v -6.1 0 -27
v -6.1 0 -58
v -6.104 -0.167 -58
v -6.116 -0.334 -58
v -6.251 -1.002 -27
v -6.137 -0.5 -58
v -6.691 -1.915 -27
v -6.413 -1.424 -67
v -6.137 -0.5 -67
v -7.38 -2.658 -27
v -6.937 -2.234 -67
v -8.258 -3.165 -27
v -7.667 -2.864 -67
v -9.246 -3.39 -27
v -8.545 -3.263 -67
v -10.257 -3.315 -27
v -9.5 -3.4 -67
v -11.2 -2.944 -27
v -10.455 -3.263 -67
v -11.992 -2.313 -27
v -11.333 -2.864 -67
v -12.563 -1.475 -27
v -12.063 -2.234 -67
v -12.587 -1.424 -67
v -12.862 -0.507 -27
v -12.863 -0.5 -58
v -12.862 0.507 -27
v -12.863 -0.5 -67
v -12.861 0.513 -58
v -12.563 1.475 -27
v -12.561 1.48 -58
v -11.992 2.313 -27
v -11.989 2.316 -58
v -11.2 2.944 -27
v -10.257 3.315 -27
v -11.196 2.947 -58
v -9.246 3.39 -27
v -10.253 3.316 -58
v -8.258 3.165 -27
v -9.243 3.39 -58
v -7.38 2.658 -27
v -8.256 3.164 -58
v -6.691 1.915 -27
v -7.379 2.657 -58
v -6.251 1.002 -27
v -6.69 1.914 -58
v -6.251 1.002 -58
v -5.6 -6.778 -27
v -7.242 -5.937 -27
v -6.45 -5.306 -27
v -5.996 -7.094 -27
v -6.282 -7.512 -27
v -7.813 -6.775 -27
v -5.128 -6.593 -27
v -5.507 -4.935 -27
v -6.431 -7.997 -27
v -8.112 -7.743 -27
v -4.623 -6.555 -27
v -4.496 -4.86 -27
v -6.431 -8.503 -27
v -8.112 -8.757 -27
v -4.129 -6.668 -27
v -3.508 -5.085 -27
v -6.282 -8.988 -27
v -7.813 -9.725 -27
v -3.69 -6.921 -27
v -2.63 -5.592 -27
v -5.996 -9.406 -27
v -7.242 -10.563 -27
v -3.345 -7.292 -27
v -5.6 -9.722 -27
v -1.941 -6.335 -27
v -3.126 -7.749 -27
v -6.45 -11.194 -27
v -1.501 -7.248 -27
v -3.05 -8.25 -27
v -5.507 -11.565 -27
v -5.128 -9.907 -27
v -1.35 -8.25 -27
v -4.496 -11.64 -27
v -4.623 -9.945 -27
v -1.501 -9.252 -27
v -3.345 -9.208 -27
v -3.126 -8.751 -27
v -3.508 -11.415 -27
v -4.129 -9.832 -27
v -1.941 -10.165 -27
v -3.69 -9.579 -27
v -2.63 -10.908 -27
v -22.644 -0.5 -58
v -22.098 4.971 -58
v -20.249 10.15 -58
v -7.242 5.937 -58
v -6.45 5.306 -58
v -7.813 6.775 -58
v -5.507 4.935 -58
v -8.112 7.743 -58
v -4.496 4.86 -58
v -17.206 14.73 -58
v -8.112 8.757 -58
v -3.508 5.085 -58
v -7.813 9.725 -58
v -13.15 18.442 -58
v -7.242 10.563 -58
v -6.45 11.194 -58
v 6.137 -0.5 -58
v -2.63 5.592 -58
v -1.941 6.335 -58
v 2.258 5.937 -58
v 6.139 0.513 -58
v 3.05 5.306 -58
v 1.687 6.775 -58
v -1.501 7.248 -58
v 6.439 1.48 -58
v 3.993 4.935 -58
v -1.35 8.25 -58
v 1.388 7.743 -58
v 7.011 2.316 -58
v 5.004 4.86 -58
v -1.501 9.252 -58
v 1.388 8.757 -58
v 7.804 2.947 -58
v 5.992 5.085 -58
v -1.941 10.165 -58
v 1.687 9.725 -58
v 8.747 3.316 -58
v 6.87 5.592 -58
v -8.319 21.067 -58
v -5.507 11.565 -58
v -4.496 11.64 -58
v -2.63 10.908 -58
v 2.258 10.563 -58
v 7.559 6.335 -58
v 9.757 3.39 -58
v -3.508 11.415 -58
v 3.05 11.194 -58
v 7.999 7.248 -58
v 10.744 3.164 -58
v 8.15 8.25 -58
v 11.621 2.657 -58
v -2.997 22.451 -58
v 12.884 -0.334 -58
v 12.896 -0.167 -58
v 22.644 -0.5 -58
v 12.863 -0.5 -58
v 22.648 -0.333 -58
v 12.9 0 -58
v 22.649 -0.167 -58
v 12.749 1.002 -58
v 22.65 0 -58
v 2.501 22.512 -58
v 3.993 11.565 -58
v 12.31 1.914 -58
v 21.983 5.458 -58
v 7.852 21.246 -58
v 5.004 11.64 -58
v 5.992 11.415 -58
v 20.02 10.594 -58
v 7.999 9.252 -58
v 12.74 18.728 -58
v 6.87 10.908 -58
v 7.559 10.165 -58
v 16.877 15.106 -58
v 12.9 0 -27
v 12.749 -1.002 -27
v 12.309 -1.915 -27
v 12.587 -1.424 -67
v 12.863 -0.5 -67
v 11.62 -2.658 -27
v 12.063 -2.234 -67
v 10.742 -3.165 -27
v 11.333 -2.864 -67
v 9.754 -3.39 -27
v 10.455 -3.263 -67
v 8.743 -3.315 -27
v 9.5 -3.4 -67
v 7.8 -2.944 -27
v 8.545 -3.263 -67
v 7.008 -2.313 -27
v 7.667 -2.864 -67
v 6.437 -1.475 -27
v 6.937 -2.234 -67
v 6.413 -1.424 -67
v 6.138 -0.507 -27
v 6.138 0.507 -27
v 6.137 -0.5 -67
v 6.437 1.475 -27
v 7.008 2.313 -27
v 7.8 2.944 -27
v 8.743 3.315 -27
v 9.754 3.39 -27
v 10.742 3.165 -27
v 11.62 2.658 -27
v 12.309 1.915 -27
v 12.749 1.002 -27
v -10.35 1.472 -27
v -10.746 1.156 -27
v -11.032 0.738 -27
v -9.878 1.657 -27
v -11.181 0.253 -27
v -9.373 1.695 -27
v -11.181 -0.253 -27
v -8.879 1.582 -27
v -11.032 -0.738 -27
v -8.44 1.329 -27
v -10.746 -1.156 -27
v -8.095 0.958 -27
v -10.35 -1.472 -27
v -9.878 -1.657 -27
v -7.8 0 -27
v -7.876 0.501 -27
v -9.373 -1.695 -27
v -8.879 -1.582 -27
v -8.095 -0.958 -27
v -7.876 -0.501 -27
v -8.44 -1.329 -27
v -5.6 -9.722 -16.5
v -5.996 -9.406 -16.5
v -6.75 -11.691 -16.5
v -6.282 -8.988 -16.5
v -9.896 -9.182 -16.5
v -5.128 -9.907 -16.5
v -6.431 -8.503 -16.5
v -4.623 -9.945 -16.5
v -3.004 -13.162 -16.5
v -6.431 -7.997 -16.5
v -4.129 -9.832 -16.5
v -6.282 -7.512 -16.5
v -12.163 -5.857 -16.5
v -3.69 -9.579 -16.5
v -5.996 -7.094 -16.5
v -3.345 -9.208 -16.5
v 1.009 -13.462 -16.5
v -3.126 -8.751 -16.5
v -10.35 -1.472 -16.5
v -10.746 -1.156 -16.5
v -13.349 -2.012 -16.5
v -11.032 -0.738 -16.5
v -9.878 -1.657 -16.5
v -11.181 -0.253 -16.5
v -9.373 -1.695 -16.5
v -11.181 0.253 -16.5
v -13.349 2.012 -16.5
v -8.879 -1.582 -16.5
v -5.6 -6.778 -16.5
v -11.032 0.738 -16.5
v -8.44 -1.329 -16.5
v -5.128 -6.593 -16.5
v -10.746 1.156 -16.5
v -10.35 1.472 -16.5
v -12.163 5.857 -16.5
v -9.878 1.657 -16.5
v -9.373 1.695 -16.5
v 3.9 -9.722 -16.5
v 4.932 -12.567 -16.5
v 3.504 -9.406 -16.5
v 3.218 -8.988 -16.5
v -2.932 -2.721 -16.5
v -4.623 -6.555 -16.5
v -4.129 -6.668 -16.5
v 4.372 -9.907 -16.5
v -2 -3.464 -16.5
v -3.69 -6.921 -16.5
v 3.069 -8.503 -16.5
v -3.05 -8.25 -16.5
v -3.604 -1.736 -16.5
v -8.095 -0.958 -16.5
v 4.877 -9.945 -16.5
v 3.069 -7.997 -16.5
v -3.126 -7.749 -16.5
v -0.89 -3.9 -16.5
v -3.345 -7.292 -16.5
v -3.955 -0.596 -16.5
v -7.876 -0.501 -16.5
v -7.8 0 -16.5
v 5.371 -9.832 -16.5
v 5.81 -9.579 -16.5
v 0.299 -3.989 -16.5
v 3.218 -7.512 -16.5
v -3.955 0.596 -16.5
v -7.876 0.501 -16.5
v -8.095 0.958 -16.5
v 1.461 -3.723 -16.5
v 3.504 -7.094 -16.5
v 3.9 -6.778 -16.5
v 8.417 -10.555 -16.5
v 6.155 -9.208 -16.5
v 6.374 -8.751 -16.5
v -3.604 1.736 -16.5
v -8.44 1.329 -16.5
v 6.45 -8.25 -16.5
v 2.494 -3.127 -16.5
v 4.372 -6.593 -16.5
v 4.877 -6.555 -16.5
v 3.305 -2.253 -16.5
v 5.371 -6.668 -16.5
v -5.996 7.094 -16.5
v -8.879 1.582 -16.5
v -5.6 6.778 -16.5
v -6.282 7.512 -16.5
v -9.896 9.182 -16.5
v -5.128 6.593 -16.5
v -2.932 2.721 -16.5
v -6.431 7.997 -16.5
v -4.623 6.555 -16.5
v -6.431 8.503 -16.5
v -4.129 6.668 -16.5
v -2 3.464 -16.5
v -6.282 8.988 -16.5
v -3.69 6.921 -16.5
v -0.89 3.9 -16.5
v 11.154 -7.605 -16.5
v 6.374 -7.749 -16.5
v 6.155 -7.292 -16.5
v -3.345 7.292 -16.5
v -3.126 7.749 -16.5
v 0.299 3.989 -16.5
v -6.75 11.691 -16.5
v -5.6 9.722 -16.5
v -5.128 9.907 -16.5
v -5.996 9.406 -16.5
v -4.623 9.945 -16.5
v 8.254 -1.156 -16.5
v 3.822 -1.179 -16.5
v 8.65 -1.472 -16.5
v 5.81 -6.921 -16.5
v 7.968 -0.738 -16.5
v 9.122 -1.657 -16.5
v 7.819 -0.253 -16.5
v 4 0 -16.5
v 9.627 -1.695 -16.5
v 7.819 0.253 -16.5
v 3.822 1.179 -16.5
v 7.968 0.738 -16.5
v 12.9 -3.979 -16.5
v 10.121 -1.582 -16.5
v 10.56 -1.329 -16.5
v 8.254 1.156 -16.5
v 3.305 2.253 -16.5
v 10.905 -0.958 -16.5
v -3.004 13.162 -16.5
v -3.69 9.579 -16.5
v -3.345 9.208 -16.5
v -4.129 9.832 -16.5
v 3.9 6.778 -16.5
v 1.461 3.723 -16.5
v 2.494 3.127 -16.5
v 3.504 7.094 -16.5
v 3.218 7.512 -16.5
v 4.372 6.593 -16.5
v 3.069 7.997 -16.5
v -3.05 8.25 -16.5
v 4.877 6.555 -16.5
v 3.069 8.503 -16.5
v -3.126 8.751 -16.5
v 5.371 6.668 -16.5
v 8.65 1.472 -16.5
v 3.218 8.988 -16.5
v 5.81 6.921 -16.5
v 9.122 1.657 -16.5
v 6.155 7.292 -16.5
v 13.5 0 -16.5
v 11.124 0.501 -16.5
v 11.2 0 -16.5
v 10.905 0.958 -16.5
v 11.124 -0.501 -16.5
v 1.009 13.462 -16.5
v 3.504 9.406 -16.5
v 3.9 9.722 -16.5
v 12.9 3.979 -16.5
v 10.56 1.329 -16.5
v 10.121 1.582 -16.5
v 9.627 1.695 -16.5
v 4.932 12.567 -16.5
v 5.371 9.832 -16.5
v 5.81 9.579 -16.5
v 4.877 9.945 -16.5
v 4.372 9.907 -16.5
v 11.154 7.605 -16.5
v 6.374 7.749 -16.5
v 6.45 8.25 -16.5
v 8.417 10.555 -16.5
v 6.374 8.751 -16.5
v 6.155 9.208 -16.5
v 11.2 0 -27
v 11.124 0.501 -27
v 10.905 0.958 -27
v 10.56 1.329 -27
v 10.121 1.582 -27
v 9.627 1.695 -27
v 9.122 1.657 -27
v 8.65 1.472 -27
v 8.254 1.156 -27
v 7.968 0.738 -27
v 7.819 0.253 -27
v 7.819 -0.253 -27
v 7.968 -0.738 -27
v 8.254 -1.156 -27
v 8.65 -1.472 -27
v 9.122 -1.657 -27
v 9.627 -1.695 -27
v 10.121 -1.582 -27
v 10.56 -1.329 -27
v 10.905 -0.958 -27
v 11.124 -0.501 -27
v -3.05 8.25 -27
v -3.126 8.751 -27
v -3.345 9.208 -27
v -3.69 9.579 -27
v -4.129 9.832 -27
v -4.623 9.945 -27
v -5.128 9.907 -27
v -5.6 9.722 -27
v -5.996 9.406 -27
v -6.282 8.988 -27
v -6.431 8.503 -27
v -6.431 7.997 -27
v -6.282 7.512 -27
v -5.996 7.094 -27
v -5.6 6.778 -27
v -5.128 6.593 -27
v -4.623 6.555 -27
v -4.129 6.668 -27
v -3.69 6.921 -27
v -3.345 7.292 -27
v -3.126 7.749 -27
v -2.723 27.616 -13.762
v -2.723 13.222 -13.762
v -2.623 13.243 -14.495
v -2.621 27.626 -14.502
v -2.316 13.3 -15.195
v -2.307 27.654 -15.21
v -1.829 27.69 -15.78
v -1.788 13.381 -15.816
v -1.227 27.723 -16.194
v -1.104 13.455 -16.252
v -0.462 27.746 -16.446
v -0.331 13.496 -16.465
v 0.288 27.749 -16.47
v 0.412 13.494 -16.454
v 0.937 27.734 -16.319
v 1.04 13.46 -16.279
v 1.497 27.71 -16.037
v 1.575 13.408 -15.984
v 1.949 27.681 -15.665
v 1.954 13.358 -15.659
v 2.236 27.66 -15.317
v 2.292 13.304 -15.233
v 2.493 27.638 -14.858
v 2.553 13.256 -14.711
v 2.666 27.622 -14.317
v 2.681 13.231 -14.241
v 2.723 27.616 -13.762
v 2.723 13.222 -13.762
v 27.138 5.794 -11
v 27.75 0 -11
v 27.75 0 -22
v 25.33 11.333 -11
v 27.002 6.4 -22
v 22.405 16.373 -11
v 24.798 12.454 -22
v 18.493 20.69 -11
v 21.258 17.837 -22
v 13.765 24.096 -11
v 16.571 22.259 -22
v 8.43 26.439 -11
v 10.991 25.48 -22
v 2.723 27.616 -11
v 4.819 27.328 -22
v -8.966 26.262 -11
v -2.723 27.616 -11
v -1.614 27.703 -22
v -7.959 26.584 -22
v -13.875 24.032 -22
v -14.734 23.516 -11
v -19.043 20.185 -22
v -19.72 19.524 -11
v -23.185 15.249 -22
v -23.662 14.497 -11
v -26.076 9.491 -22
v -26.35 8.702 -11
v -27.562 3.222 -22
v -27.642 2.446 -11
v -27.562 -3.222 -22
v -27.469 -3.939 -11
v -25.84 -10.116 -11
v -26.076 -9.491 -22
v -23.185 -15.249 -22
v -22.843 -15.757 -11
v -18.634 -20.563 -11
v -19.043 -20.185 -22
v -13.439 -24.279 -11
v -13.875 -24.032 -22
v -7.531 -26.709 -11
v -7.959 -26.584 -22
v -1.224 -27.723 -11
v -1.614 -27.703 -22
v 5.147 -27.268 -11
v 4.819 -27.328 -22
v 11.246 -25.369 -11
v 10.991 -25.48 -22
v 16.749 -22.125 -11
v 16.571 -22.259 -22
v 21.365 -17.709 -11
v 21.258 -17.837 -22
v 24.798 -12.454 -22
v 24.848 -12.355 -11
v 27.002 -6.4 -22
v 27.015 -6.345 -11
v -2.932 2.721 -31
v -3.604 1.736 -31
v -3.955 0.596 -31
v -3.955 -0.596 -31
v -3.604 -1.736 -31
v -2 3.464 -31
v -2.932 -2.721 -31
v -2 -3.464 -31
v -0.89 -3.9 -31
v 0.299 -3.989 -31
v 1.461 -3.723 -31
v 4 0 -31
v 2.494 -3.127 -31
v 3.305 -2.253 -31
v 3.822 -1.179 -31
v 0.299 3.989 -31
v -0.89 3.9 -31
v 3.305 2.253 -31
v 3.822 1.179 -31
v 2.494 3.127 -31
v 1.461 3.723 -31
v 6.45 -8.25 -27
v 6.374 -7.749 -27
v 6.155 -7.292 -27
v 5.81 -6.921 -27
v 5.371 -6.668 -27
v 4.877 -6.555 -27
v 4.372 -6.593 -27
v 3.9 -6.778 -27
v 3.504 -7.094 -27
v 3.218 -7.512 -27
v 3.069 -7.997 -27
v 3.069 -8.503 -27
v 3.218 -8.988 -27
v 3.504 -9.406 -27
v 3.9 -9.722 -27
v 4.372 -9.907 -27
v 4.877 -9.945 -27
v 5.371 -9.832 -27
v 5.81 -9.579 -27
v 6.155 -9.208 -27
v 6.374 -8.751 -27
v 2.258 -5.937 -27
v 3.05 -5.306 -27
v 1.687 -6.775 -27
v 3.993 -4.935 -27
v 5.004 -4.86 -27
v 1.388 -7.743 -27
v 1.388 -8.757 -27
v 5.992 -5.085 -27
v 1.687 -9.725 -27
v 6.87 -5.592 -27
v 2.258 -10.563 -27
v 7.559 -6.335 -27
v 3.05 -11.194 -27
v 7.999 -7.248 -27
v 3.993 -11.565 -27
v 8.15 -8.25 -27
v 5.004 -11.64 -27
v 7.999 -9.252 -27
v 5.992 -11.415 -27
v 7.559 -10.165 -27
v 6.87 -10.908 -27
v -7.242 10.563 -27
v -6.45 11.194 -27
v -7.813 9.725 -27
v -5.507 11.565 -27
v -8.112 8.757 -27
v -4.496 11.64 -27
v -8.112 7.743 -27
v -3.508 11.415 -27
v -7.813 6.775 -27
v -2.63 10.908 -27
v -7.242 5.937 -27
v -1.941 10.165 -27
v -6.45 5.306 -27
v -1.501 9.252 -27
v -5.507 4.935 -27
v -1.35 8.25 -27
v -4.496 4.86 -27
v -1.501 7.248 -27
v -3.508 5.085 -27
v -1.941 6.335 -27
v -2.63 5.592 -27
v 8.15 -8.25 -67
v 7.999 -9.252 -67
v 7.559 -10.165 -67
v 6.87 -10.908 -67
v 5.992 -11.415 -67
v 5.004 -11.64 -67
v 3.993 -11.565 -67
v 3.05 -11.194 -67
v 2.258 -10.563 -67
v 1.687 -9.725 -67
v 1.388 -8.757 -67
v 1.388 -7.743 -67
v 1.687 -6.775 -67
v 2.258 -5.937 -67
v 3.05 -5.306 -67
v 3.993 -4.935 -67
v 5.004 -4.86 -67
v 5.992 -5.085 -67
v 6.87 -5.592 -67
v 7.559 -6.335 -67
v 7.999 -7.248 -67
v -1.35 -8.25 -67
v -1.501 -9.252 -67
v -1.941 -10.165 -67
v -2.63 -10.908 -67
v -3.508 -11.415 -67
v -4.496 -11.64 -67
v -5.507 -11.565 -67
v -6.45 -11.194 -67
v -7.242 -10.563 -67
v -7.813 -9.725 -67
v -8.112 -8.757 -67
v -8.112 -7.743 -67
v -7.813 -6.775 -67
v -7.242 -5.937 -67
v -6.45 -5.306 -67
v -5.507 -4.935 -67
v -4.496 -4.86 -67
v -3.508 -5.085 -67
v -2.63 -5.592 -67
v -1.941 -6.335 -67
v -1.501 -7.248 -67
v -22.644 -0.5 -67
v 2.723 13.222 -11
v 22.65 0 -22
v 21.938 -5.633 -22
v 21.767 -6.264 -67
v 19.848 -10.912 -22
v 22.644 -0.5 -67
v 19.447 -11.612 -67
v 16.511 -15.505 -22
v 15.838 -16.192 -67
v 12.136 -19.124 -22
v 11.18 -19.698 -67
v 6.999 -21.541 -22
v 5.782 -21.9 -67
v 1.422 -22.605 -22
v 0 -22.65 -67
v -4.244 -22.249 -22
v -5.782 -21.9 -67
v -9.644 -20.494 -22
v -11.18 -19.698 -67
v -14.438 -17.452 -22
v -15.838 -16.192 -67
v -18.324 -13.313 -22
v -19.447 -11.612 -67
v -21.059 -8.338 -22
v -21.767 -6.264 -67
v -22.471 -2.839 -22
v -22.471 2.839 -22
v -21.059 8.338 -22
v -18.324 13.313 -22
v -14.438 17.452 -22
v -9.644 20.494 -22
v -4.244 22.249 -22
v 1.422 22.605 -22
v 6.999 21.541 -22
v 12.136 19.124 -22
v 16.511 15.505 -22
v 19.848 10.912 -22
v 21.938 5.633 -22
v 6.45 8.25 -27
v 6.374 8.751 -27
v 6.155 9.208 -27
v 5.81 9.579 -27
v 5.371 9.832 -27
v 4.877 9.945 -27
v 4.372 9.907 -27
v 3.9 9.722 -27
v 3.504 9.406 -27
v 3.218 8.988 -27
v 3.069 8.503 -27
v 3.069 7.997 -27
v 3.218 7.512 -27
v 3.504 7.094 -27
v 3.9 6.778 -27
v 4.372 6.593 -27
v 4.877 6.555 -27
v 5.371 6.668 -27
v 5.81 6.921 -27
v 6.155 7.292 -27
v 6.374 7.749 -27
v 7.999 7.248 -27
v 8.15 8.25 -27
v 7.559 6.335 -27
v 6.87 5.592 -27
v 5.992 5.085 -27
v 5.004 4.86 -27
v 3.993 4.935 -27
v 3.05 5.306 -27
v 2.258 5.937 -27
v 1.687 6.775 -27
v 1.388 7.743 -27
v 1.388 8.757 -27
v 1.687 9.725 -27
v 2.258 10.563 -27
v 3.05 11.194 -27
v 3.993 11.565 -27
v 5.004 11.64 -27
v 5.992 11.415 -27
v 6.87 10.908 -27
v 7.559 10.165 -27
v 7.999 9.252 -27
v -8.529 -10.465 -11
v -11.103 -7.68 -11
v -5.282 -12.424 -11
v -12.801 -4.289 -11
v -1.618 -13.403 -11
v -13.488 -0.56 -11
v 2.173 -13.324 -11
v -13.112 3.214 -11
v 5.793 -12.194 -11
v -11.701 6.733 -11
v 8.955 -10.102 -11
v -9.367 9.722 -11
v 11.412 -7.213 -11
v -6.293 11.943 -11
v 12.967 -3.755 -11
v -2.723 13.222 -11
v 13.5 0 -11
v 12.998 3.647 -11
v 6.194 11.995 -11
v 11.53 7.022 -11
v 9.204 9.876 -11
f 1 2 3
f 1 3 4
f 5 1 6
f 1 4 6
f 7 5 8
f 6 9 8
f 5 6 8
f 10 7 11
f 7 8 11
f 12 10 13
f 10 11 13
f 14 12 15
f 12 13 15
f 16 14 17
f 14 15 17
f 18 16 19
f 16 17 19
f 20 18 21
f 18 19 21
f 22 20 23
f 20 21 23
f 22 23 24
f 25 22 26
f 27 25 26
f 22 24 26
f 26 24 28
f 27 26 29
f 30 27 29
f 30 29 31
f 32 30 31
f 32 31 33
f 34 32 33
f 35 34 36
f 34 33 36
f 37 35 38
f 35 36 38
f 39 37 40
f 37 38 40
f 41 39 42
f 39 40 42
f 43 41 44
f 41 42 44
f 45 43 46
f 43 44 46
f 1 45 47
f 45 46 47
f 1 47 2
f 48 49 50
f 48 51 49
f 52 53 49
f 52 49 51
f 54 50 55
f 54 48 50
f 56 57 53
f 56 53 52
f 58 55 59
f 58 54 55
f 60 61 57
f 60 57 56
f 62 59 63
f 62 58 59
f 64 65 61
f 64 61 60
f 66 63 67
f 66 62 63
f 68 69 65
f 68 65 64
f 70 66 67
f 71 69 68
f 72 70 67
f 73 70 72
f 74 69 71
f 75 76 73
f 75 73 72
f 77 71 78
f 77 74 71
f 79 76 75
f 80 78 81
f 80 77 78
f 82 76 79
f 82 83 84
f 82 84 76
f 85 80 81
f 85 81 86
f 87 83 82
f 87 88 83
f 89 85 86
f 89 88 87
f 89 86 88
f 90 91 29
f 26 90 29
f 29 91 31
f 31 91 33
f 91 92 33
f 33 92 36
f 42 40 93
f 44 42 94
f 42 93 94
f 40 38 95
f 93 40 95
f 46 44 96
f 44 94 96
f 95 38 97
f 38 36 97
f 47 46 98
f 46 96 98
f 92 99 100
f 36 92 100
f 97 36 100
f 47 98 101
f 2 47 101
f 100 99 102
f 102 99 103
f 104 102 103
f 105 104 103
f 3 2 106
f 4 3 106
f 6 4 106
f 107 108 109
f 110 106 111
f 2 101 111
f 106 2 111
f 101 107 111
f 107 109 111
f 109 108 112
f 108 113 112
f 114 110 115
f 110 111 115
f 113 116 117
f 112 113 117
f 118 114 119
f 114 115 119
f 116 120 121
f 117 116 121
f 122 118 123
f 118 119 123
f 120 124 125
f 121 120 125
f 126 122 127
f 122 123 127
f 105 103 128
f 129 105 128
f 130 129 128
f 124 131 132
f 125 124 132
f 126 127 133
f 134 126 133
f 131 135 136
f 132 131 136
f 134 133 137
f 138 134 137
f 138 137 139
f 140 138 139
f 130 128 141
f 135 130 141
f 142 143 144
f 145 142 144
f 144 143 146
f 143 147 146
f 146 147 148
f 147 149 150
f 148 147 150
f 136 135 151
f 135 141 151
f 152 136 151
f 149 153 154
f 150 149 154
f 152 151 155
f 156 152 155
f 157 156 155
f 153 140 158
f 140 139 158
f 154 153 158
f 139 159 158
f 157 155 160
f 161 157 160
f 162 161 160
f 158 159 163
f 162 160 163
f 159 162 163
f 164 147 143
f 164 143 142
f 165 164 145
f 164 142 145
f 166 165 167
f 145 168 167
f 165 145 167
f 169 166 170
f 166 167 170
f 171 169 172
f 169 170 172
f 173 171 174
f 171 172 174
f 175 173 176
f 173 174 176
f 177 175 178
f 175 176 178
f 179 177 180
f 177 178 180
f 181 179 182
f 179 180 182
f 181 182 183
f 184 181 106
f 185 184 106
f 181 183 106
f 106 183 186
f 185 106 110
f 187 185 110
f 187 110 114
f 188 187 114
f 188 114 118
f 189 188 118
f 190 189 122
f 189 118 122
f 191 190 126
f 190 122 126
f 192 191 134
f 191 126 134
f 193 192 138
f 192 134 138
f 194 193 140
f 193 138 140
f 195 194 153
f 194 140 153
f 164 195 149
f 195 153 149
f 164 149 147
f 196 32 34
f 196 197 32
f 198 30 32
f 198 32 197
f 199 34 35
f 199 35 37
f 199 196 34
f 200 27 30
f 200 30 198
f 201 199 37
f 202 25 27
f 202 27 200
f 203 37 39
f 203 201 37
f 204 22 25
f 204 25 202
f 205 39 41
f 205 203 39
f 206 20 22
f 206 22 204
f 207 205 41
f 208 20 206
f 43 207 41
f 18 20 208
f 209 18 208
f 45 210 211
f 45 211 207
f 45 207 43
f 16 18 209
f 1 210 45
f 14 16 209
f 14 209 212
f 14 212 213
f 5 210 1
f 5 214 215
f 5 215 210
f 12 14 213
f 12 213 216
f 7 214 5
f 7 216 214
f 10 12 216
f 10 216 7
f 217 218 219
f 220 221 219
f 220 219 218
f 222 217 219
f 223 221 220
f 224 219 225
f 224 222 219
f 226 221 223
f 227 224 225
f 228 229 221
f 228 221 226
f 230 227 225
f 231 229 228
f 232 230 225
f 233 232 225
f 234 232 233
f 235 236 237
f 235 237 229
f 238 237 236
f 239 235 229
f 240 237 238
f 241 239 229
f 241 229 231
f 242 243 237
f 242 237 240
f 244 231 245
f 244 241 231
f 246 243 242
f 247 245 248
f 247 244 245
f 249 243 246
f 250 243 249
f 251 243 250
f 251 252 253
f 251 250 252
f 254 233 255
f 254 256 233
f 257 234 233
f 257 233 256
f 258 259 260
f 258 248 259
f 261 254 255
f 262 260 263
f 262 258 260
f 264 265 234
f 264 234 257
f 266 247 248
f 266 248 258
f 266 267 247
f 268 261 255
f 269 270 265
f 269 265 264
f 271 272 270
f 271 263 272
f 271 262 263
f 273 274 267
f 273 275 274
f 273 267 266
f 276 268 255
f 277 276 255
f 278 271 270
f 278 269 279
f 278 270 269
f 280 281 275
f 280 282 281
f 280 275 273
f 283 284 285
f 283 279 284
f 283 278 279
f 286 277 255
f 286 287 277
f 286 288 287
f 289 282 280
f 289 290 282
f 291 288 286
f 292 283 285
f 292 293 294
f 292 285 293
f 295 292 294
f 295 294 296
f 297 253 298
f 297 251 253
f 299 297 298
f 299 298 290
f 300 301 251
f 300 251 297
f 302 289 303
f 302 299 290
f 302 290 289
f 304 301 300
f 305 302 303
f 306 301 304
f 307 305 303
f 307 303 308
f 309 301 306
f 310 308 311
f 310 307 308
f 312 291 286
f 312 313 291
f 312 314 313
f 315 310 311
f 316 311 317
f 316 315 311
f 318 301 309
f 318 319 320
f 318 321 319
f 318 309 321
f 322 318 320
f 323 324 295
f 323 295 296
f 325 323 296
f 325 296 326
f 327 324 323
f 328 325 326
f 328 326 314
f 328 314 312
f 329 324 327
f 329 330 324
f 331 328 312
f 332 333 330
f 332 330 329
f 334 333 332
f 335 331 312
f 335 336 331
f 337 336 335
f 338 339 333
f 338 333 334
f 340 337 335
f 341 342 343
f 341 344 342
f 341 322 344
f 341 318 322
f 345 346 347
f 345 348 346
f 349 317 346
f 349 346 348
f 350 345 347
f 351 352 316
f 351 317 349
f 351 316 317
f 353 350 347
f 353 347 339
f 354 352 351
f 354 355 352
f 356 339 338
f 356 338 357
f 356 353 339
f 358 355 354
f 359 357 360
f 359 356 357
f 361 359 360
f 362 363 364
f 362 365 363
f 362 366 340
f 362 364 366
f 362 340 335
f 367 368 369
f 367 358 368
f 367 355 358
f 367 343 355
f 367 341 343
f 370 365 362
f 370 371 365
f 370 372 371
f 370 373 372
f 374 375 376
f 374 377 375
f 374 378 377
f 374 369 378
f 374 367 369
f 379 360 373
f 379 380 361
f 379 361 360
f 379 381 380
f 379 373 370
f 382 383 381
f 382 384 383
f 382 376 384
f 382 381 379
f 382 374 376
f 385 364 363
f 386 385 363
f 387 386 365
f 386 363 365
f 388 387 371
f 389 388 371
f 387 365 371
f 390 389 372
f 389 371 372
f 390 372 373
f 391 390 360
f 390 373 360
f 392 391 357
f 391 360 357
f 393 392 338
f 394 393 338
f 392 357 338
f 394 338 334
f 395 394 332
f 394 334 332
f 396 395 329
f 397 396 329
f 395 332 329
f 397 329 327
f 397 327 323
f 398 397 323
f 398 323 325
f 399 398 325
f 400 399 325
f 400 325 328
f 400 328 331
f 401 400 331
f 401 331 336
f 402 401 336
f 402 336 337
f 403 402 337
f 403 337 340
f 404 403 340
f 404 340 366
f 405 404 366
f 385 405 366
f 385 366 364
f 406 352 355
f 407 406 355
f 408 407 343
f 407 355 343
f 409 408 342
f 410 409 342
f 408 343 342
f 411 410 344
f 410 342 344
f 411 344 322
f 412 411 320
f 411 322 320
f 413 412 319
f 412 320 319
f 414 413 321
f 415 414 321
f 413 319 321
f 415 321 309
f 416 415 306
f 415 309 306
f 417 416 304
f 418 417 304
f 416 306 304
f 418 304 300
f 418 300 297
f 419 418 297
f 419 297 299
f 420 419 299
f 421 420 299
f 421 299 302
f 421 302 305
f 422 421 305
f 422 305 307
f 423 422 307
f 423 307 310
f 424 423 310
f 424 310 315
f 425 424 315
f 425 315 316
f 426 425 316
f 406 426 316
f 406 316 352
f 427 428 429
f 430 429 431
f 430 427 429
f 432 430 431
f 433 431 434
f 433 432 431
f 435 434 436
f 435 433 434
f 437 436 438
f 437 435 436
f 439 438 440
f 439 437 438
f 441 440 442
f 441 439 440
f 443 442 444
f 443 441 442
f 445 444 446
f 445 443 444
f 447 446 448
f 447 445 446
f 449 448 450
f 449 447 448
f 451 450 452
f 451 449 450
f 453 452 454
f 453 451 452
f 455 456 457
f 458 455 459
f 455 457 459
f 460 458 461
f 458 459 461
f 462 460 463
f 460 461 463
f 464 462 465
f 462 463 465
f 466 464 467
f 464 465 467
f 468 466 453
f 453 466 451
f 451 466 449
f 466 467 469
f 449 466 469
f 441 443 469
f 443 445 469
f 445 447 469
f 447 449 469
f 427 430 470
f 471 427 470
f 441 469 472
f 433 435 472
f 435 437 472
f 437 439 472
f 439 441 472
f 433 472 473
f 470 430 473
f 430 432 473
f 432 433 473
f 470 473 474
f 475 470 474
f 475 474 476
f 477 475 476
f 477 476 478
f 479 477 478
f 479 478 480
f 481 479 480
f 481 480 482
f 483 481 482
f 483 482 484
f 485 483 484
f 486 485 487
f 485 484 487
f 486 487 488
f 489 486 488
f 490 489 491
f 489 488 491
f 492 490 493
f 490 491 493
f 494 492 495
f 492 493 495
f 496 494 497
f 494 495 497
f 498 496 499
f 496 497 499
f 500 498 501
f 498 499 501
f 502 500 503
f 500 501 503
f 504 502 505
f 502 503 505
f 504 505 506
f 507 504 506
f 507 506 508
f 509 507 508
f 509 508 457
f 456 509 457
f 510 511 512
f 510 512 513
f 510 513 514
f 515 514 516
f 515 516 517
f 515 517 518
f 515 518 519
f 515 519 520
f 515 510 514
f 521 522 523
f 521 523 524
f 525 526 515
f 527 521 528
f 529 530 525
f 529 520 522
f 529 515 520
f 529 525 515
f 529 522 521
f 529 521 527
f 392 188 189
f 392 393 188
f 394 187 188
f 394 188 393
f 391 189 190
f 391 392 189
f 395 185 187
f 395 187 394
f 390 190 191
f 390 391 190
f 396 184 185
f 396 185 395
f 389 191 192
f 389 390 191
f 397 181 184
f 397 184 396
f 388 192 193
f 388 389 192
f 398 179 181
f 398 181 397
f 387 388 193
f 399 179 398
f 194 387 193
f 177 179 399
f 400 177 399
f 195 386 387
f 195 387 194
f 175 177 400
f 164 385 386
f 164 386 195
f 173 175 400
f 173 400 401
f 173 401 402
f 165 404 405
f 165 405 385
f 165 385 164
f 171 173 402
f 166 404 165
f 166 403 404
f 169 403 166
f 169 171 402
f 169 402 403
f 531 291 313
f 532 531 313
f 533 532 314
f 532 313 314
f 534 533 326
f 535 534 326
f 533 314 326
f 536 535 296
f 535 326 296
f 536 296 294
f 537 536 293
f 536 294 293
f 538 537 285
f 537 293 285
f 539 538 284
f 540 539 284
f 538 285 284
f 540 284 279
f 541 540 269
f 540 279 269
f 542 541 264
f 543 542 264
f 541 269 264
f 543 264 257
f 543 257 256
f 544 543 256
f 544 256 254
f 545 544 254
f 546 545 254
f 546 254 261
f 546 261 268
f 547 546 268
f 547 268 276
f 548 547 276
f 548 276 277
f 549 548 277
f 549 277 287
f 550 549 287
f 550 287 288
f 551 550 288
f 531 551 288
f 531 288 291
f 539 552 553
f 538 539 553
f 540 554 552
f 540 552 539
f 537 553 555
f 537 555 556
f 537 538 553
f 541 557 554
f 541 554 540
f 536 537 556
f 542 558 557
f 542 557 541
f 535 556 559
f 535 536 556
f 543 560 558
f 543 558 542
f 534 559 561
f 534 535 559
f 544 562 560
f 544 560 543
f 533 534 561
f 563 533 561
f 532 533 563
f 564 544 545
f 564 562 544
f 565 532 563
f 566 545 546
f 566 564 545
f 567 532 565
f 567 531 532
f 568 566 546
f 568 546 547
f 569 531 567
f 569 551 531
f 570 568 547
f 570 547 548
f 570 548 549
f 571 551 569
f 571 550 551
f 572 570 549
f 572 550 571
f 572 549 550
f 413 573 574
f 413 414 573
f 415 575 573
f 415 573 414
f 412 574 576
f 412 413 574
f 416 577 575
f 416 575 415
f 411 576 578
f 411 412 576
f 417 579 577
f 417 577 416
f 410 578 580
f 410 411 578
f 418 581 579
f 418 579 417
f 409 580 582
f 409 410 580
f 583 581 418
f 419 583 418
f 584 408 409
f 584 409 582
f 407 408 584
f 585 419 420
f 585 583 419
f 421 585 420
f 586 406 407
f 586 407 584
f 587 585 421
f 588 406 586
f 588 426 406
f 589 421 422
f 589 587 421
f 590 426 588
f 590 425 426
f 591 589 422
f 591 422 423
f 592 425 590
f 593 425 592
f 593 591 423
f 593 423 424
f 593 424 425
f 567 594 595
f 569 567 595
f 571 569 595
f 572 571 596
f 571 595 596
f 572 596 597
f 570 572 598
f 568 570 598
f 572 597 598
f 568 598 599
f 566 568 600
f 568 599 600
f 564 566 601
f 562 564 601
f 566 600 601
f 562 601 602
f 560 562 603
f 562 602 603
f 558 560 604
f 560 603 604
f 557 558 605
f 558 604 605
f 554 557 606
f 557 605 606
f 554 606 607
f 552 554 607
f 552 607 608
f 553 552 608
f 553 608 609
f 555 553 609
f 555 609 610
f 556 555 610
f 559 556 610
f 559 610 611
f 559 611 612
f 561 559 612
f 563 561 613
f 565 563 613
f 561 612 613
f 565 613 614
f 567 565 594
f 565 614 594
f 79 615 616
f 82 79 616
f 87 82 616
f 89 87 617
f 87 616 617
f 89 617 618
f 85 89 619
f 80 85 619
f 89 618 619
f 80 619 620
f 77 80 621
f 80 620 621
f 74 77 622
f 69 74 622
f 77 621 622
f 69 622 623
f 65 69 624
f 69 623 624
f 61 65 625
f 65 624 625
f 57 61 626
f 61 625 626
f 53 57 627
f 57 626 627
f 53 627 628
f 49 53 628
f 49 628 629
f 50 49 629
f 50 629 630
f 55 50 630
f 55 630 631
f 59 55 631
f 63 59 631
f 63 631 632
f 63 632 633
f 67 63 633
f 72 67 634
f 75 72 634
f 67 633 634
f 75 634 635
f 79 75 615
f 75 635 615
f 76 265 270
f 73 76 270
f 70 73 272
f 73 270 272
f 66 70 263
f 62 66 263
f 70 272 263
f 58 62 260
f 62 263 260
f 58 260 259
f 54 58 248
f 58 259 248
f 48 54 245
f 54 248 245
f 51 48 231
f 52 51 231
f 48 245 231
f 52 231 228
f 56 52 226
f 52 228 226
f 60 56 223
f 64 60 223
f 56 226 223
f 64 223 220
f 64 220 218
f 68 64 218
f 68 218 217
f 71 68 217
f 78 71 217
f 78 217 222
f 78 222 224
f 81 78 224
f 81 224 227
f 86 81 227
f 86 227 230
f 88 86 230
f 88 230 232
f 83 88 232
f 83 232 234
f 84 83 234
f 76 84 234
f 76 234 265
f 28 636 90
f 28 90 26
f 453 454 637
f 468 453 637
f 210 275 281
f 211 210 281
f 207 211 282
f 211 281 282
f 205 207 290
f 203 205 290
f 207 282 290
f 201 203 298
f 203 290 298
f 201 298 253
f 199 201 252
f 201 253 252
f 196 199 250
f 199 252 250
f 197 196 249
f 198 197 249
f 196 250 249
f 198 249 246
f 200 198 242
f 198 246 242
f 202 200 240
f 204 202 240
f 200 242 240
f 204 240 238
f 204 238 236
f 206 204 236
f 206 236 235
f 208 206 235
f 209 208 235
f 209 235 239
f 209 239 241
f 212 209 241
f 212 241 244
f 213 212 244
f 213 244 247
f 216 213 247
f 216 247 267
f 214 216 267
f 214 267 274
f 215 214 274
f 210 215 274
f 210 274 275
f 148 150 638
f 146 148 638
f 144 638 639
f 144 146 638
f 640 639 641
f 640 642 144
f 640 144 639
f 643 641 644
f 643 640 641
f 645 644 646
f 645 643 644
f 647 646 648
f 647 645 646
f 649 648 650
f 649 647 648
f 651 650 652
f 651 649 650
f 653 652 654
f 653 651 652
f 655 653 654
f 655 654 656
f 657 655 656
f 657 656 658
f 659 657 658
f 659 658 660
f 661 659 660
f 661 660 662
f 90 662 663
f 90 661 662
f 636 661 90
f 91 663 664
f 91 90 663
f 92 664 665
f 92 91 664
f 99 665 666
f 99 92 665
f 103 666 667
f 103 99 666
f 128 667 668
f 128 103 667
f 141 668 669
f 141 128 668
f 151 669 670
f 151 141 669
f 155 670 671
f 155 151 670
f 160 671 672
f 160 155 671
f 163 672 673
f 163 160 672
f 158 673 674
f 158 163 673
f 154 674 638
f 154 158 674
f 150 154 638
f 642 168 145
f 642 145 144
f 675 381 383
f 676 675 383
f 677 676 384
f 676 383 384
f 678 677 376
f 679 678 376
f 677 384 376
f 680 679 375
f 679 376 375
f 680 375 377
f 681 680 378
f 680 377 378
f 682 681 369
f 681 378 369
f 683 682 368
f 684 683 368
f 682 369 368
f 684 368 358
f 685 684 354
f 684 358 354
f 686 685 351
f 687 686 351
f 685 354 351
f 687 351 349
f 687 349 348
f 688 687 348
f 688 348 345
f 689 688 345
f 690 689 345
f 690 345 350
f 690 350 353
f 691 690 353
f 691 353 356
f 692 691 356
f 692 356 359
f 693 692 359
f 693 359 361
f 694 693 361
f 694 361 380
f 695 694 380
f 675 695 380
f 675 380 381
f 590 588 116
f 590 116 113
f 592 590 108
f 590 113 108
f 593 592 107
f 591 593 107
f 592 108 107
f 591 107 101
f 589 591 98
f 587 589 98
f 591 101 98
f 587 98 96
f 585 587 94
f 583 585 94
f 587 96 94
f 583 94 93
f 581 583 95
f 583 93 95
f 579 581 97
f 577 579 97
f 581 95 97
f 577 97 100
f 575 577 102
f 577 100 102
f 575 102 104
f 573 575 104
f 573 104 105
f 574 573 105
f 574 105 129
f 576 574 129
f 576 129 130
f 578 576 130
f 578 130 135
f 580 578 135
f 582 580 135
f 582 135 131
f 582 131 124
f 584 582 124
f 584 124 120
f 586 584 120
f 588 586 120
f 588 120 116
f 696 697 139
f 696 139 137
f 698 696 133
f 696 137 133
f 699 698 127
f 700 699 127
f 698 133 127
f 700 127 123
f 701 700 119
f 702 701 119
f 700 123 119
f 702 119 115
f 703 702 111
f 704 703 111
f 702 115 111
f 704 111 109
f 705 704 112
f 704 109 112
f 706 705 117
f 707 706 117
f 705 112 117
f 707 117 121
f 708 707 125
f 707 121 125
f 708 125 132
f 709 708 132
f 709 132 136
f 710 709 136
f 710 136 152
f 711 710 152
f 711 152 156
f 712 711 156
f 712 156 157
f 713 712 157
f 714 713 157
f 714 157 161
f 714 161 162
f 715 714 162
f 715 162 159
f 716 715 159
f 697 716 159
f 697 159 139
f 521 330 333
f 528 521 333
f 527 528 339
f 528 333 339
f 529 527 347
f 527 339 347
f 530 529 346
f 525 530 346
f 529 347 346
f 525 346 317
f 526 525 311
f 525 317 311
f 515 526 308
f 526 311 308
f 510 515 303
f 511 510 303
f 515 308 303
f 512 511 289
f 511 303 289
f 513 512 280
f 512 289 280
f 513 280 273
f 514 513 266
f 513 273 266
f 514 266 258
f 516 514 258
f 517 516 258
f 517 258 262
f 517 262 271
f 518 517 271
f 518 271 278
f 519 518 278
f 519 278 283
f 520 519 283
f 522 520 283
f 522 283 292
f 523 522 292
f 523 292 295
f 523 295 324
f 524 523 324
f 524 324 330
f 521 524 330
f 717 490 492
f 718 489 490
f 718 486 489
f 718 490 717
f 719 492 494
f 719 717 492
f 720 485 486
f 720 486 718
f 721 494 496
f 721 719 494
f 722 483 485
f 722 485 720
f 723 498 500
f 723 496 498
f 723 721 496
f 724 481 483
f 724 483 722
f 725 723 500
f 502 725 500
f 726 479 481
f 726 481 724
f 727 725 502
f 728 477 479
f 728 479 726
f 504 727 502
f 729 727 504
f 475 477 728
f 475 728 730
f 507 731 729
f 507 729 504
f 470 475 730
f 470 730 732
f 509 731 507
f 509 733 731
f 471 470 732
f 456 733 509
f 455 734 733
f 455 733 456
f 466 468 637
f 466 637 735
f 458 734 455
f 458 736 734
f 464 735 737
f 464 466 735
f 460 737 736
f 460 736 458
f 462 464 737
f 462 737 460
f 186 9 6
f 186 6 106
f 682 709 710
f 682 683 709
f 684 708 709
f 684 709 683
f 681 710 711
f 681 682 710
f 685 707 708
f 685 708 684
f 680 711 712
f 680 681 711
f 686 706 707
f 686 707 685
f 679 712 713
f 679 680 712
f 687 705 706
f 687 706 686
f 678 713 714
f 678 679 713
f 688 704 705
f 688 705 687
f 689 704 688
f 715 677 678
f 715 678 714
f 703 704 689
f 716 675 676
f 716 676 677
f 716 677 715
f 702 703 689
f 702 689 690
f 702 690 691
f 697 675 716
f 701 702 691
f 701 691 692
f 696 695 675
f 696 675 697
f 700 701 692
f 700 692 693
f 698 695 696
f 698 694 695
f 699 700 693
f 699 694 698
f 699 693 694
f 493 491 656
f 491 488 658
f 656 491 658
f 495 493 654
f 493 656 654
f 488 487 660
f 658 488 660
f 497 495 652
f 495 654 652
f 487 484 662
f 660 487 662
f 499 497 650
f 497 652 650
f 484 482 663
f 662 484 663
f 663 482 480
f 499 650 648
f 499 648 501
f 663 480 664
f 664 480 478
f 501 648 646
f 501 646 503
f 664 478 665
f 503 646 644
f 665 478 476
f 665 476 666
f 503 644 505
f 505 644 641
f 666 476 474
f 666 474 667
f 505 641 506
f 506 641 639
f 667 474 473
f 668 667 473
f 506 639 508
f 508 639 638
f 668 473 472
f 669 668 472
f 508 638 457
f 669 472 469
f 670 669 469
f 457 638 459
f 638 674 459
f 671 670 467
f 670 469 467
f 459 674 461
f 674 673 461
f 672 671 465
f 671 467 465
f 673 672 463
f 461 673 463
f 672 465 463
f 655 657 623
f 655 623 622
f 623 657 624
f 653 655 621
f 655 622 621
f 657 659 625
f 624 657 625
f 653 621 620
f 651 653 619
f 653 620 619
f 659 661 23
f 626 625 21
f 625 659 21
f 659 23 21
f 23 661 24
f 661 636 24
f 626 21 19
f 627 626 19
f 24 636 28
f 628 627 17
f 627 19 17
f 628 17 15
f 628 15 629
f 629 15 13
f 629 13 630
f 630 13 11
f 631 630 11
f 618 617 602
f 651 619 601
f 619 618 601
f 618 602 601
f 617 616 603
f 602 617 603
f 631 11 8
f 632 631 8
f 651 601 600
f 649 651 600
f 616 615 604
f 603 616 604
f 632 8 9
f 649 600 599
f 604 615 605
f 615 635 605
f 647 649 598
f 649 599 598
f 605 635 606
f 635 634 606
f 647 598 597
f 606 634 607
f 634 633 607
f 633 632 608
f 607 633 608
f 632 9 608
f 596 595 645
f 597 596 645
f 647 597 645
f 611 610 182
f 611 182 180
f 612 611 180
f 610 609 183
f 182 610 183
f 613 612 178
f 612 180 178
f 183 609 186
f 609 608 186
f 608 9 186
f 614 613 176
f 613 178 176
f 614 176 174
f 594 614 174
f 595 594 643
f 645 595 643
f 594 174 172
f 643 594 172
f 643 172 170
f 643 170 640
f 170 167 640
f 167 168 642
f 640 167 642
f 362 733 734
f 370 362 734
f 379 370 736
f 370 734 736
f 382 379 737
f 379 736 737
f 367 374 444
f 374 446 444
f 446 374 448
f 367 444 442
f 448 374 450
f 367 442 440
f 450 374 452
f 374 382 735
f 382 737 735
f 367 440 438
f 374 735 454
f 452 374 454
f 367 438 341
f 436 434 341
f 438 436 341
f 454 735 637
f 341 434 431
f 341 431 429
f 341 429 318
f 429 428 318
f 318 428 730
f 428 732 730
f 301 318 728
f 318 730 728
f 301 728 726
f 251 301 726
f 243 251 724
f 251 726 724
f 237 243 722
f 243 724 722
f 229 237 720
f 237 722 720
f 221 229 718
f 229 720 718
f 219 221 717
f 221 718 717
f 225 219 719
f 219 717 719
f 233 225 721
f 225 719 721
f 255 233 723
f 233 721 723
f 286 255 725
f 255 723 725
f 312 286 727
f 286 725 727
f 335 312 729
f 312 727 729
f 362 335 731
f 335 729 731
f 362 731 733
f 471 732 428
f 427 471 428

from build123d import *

# Parameters (mm, degrees)
BOX002_W          = 80
BOX002_H          = 100
BOX002_DEPTH      = 10
BOX_W             = 10
BOX_H             = 10
BOX_DEPTH         = 10.8
CYLINDER002_R     = 2.15
CYLINDER002_DEPTH = 10.8
CYLINDER_R        = 22.75
CYLINDER_DEPTH    = 60
CYLINDER001_R     = 27.75
CYLINDER001_DEPTH = 15
SKETCH025_R       = 48.85367
POCKET023_DEPTH   = 4
SKETCH026_R       = 13.5
POCKET024_DEPTH   = 5.5
SKETCH027_R       = 4
POCKET025_DEPTH   = 20
SKETCH028_R       = 1.7
POCKET026_DEPTH   = 56.001
SKETCH029_R       = 3.4
POCKET027_DEPTH   = 40
POCKET028_DEPTH   = 19
SKETCH050_R       = 33.40384
SKETCH050_R_2     = 22.65
POCKET041_DEPTH   = 45


with BuildPart() as cutcube001:
    # Box002 → Box002 (new body)
    with BuildSketch(Plane(origin=(-40, -0.5, -1), x_dir=(1, 0, 0), z_dir=(0, 0, 1))):
        with Locations((40, 50)):
            Rectangle(BOX002_W, BOX002_H)
    extrude(amount=BOX002_DEPTH)


with BuildPart() as cube:
    # Box → Box (new body)
    with BuildSketch(Plane(origin=(-5, 1.536842, 0), x_dir=(1, 0, 0), z_dir=(0, 0, 1))):
        with Locations((5, 5)):
            Rectangle(BOX_W, BOX_H)
    extrude(amount=BOX_DEPTH)


with BuildPart() as motor_shaft_hole:
    # Cylinder002 → Cylinder002 (new body)
    with BuildSketch(Plane.XY):
        Circle(CYLINDER002_R)
    extrude(amount=CYLINDER002_DEPTH)

    # Cut: cut Cube
    add(cube.part, mode=Mode.SUBTRACT)


with BuildPart() as motor_shaft_hole_1:
    # Cut placement: moved
    add(motor_shaft_hole.part.moved(Location((0, 0, 49.2))))


with BuildPart() as cylinder_plug_inner:
    # Cylinder → Cylinder (new body)
    with BuildSketch(Plane.XY):
        Circle(CYLINDER_R)
    extrude(amount=CYLINDER_DEPTH)


with BuildPart() as body002:
    # Cylinder001 → Cylinder001 (new body)
    with BuildSketch(Plane.XY.offset(45)):
        Circle(CYLINDER001_R)
    extrude(amount=CYLINDER001_DEPTH)

    # Fusion: union Cylinder_plug_inner
    add(cylinder_plug_inner.part)

    # Cut001: cut Motor_shaft_hole
    add(motor_shaft_hole_1.part, mode=Mode.SUBTRACT)

    # Cut003: cut CutCube001
    add(cutcube001.part, mode=Mode.SUBTRACT)


with BuildPart() as body002_1:
    # Cut003 placement: moved
    add(body002.part.moved(Location((135, 0, 0))))


with BuildPart() as body002_2:
    # BaseFeature001 placement: moved
    add(body002_1.part.moved(Location((-135, 0, 0))))

    # Sketch025 (on Face5 of BaseFeature001) → Pocket023 (cut)
    with BuildSketch(Plane.XY.offset(60)):
        Circle(SKETCH025_R)
    extrude(amount=-POCKET023_DEPTH, mode=Mode.SUBTRACT)

    # Sketch026 (on Face3 of Pocket023) → Pocket024 (cut)
    with BuildSketch(Plane.XY.offset(56)):
        Circle(SKETCH026_R)
    extrude(amount=-POCKET024_DEPTH, mode=Mode.SUBTRACT)

    # Sketch027 (on Face3 of Pocket024) → Pocket025 (cut)
    with BuildSketch(Plane.XY.offset(56)):
        Circle(SKETCH027_R)
    extrude(amount=-POCKET025_DEPTH, mode=Mode.SUBTRACT)

    # Sketch028 (on Face3 of Pocket025) → Pocket026 (cut, through all)
    with BuildSketch(Plane.XY.offset(56)):
        with Locations((-4.75, 8.25)):
            Circle(SKETCH028_R)
        with Locations((4.75, 8.25)):
            Circle(SKETCH028_R)
        with Locations((4.75, -8.25)):
            Circle(SKETCH028_R)
        with Locations((-4.75, -8.25)):
            Circle(SKETCH028_R)
        with Locations((-9.5, 0)):
            Circle(SKETCH028_R)
        with Locations((9.5, 0)):
            Circle(SKETCH028_R)
    extrude(amount=-POCKET026_DEPTH, mode=Mode.SUBTRACT)

    # Sketch029 (on Face6 of Pocket026) → Pocket027 (cut)
    with BuildSketch(Plane(origin=(0, 0, 0), x_dir=(1, 0, 0), z_dir=(0, 0, -1))):
        with Locations((-4.75, 8.25)):
            Circle(SKETCH029_R)
        with Locations((4.75, 8.25)):
            Circle(SKETCH029_R)
        with Locations((9.5, 0)):
            Circle(SKETCH029_R)
        with Locations((-9.5, 0)):
            Circle(SKETCH029_R)
        with Locations((-4.75, -8.25)):
            Circle(SKETCH029_R)
        with Locations((4.75, -8.25)):
            Circle(SKETCH029_R)
    extrude(amount=-POCKET027_DEPTH, mode=Mode.SUBTRACT)

    # Sketch030 (on DatumPlane) → Pocket028 (cut)
    with BuildSketch(Plane.XZ.offset(-28)):
        with BuildLine():
            ThreePointArc((-2.723427, 53.237899), (0, 50.514472), (2.723427, 53.237899))
            Line((2.723427, 53.237899), (2.723427, 64.839276))
            ThreePointArc((2.723427, 64.839276), (0, 67.562703), (-2.723427, 64.839276))
            Line((-2.723427, 64.839276), (-2.723427, 53.237899))
        make_face()
    extrude(amount=POCKET028_DEPTH, mode=Mode.SUBTRACT)

    # Sketch050 (on Face10 of Pocket028) → Pocket041 (cut)
    with BuildSketch(Plane(origin=(0, 0, 0), x_dir=(1, 0, 0), z_dir=(0, 0, -1))):
        Circle(SKETCH050_R)
        Circle(SKETCH050_R_2, mode=Mode.SUBTRACT)
    extrude(amount=-POCKET041_DEPTH, mode=Mode.SUBTRACT)


with BuildPart() as body002_3:
    # Body002 placement: moved
    add(body002_2.part.moved(Location((0, 0, -67))))


solid = body002_3.part
